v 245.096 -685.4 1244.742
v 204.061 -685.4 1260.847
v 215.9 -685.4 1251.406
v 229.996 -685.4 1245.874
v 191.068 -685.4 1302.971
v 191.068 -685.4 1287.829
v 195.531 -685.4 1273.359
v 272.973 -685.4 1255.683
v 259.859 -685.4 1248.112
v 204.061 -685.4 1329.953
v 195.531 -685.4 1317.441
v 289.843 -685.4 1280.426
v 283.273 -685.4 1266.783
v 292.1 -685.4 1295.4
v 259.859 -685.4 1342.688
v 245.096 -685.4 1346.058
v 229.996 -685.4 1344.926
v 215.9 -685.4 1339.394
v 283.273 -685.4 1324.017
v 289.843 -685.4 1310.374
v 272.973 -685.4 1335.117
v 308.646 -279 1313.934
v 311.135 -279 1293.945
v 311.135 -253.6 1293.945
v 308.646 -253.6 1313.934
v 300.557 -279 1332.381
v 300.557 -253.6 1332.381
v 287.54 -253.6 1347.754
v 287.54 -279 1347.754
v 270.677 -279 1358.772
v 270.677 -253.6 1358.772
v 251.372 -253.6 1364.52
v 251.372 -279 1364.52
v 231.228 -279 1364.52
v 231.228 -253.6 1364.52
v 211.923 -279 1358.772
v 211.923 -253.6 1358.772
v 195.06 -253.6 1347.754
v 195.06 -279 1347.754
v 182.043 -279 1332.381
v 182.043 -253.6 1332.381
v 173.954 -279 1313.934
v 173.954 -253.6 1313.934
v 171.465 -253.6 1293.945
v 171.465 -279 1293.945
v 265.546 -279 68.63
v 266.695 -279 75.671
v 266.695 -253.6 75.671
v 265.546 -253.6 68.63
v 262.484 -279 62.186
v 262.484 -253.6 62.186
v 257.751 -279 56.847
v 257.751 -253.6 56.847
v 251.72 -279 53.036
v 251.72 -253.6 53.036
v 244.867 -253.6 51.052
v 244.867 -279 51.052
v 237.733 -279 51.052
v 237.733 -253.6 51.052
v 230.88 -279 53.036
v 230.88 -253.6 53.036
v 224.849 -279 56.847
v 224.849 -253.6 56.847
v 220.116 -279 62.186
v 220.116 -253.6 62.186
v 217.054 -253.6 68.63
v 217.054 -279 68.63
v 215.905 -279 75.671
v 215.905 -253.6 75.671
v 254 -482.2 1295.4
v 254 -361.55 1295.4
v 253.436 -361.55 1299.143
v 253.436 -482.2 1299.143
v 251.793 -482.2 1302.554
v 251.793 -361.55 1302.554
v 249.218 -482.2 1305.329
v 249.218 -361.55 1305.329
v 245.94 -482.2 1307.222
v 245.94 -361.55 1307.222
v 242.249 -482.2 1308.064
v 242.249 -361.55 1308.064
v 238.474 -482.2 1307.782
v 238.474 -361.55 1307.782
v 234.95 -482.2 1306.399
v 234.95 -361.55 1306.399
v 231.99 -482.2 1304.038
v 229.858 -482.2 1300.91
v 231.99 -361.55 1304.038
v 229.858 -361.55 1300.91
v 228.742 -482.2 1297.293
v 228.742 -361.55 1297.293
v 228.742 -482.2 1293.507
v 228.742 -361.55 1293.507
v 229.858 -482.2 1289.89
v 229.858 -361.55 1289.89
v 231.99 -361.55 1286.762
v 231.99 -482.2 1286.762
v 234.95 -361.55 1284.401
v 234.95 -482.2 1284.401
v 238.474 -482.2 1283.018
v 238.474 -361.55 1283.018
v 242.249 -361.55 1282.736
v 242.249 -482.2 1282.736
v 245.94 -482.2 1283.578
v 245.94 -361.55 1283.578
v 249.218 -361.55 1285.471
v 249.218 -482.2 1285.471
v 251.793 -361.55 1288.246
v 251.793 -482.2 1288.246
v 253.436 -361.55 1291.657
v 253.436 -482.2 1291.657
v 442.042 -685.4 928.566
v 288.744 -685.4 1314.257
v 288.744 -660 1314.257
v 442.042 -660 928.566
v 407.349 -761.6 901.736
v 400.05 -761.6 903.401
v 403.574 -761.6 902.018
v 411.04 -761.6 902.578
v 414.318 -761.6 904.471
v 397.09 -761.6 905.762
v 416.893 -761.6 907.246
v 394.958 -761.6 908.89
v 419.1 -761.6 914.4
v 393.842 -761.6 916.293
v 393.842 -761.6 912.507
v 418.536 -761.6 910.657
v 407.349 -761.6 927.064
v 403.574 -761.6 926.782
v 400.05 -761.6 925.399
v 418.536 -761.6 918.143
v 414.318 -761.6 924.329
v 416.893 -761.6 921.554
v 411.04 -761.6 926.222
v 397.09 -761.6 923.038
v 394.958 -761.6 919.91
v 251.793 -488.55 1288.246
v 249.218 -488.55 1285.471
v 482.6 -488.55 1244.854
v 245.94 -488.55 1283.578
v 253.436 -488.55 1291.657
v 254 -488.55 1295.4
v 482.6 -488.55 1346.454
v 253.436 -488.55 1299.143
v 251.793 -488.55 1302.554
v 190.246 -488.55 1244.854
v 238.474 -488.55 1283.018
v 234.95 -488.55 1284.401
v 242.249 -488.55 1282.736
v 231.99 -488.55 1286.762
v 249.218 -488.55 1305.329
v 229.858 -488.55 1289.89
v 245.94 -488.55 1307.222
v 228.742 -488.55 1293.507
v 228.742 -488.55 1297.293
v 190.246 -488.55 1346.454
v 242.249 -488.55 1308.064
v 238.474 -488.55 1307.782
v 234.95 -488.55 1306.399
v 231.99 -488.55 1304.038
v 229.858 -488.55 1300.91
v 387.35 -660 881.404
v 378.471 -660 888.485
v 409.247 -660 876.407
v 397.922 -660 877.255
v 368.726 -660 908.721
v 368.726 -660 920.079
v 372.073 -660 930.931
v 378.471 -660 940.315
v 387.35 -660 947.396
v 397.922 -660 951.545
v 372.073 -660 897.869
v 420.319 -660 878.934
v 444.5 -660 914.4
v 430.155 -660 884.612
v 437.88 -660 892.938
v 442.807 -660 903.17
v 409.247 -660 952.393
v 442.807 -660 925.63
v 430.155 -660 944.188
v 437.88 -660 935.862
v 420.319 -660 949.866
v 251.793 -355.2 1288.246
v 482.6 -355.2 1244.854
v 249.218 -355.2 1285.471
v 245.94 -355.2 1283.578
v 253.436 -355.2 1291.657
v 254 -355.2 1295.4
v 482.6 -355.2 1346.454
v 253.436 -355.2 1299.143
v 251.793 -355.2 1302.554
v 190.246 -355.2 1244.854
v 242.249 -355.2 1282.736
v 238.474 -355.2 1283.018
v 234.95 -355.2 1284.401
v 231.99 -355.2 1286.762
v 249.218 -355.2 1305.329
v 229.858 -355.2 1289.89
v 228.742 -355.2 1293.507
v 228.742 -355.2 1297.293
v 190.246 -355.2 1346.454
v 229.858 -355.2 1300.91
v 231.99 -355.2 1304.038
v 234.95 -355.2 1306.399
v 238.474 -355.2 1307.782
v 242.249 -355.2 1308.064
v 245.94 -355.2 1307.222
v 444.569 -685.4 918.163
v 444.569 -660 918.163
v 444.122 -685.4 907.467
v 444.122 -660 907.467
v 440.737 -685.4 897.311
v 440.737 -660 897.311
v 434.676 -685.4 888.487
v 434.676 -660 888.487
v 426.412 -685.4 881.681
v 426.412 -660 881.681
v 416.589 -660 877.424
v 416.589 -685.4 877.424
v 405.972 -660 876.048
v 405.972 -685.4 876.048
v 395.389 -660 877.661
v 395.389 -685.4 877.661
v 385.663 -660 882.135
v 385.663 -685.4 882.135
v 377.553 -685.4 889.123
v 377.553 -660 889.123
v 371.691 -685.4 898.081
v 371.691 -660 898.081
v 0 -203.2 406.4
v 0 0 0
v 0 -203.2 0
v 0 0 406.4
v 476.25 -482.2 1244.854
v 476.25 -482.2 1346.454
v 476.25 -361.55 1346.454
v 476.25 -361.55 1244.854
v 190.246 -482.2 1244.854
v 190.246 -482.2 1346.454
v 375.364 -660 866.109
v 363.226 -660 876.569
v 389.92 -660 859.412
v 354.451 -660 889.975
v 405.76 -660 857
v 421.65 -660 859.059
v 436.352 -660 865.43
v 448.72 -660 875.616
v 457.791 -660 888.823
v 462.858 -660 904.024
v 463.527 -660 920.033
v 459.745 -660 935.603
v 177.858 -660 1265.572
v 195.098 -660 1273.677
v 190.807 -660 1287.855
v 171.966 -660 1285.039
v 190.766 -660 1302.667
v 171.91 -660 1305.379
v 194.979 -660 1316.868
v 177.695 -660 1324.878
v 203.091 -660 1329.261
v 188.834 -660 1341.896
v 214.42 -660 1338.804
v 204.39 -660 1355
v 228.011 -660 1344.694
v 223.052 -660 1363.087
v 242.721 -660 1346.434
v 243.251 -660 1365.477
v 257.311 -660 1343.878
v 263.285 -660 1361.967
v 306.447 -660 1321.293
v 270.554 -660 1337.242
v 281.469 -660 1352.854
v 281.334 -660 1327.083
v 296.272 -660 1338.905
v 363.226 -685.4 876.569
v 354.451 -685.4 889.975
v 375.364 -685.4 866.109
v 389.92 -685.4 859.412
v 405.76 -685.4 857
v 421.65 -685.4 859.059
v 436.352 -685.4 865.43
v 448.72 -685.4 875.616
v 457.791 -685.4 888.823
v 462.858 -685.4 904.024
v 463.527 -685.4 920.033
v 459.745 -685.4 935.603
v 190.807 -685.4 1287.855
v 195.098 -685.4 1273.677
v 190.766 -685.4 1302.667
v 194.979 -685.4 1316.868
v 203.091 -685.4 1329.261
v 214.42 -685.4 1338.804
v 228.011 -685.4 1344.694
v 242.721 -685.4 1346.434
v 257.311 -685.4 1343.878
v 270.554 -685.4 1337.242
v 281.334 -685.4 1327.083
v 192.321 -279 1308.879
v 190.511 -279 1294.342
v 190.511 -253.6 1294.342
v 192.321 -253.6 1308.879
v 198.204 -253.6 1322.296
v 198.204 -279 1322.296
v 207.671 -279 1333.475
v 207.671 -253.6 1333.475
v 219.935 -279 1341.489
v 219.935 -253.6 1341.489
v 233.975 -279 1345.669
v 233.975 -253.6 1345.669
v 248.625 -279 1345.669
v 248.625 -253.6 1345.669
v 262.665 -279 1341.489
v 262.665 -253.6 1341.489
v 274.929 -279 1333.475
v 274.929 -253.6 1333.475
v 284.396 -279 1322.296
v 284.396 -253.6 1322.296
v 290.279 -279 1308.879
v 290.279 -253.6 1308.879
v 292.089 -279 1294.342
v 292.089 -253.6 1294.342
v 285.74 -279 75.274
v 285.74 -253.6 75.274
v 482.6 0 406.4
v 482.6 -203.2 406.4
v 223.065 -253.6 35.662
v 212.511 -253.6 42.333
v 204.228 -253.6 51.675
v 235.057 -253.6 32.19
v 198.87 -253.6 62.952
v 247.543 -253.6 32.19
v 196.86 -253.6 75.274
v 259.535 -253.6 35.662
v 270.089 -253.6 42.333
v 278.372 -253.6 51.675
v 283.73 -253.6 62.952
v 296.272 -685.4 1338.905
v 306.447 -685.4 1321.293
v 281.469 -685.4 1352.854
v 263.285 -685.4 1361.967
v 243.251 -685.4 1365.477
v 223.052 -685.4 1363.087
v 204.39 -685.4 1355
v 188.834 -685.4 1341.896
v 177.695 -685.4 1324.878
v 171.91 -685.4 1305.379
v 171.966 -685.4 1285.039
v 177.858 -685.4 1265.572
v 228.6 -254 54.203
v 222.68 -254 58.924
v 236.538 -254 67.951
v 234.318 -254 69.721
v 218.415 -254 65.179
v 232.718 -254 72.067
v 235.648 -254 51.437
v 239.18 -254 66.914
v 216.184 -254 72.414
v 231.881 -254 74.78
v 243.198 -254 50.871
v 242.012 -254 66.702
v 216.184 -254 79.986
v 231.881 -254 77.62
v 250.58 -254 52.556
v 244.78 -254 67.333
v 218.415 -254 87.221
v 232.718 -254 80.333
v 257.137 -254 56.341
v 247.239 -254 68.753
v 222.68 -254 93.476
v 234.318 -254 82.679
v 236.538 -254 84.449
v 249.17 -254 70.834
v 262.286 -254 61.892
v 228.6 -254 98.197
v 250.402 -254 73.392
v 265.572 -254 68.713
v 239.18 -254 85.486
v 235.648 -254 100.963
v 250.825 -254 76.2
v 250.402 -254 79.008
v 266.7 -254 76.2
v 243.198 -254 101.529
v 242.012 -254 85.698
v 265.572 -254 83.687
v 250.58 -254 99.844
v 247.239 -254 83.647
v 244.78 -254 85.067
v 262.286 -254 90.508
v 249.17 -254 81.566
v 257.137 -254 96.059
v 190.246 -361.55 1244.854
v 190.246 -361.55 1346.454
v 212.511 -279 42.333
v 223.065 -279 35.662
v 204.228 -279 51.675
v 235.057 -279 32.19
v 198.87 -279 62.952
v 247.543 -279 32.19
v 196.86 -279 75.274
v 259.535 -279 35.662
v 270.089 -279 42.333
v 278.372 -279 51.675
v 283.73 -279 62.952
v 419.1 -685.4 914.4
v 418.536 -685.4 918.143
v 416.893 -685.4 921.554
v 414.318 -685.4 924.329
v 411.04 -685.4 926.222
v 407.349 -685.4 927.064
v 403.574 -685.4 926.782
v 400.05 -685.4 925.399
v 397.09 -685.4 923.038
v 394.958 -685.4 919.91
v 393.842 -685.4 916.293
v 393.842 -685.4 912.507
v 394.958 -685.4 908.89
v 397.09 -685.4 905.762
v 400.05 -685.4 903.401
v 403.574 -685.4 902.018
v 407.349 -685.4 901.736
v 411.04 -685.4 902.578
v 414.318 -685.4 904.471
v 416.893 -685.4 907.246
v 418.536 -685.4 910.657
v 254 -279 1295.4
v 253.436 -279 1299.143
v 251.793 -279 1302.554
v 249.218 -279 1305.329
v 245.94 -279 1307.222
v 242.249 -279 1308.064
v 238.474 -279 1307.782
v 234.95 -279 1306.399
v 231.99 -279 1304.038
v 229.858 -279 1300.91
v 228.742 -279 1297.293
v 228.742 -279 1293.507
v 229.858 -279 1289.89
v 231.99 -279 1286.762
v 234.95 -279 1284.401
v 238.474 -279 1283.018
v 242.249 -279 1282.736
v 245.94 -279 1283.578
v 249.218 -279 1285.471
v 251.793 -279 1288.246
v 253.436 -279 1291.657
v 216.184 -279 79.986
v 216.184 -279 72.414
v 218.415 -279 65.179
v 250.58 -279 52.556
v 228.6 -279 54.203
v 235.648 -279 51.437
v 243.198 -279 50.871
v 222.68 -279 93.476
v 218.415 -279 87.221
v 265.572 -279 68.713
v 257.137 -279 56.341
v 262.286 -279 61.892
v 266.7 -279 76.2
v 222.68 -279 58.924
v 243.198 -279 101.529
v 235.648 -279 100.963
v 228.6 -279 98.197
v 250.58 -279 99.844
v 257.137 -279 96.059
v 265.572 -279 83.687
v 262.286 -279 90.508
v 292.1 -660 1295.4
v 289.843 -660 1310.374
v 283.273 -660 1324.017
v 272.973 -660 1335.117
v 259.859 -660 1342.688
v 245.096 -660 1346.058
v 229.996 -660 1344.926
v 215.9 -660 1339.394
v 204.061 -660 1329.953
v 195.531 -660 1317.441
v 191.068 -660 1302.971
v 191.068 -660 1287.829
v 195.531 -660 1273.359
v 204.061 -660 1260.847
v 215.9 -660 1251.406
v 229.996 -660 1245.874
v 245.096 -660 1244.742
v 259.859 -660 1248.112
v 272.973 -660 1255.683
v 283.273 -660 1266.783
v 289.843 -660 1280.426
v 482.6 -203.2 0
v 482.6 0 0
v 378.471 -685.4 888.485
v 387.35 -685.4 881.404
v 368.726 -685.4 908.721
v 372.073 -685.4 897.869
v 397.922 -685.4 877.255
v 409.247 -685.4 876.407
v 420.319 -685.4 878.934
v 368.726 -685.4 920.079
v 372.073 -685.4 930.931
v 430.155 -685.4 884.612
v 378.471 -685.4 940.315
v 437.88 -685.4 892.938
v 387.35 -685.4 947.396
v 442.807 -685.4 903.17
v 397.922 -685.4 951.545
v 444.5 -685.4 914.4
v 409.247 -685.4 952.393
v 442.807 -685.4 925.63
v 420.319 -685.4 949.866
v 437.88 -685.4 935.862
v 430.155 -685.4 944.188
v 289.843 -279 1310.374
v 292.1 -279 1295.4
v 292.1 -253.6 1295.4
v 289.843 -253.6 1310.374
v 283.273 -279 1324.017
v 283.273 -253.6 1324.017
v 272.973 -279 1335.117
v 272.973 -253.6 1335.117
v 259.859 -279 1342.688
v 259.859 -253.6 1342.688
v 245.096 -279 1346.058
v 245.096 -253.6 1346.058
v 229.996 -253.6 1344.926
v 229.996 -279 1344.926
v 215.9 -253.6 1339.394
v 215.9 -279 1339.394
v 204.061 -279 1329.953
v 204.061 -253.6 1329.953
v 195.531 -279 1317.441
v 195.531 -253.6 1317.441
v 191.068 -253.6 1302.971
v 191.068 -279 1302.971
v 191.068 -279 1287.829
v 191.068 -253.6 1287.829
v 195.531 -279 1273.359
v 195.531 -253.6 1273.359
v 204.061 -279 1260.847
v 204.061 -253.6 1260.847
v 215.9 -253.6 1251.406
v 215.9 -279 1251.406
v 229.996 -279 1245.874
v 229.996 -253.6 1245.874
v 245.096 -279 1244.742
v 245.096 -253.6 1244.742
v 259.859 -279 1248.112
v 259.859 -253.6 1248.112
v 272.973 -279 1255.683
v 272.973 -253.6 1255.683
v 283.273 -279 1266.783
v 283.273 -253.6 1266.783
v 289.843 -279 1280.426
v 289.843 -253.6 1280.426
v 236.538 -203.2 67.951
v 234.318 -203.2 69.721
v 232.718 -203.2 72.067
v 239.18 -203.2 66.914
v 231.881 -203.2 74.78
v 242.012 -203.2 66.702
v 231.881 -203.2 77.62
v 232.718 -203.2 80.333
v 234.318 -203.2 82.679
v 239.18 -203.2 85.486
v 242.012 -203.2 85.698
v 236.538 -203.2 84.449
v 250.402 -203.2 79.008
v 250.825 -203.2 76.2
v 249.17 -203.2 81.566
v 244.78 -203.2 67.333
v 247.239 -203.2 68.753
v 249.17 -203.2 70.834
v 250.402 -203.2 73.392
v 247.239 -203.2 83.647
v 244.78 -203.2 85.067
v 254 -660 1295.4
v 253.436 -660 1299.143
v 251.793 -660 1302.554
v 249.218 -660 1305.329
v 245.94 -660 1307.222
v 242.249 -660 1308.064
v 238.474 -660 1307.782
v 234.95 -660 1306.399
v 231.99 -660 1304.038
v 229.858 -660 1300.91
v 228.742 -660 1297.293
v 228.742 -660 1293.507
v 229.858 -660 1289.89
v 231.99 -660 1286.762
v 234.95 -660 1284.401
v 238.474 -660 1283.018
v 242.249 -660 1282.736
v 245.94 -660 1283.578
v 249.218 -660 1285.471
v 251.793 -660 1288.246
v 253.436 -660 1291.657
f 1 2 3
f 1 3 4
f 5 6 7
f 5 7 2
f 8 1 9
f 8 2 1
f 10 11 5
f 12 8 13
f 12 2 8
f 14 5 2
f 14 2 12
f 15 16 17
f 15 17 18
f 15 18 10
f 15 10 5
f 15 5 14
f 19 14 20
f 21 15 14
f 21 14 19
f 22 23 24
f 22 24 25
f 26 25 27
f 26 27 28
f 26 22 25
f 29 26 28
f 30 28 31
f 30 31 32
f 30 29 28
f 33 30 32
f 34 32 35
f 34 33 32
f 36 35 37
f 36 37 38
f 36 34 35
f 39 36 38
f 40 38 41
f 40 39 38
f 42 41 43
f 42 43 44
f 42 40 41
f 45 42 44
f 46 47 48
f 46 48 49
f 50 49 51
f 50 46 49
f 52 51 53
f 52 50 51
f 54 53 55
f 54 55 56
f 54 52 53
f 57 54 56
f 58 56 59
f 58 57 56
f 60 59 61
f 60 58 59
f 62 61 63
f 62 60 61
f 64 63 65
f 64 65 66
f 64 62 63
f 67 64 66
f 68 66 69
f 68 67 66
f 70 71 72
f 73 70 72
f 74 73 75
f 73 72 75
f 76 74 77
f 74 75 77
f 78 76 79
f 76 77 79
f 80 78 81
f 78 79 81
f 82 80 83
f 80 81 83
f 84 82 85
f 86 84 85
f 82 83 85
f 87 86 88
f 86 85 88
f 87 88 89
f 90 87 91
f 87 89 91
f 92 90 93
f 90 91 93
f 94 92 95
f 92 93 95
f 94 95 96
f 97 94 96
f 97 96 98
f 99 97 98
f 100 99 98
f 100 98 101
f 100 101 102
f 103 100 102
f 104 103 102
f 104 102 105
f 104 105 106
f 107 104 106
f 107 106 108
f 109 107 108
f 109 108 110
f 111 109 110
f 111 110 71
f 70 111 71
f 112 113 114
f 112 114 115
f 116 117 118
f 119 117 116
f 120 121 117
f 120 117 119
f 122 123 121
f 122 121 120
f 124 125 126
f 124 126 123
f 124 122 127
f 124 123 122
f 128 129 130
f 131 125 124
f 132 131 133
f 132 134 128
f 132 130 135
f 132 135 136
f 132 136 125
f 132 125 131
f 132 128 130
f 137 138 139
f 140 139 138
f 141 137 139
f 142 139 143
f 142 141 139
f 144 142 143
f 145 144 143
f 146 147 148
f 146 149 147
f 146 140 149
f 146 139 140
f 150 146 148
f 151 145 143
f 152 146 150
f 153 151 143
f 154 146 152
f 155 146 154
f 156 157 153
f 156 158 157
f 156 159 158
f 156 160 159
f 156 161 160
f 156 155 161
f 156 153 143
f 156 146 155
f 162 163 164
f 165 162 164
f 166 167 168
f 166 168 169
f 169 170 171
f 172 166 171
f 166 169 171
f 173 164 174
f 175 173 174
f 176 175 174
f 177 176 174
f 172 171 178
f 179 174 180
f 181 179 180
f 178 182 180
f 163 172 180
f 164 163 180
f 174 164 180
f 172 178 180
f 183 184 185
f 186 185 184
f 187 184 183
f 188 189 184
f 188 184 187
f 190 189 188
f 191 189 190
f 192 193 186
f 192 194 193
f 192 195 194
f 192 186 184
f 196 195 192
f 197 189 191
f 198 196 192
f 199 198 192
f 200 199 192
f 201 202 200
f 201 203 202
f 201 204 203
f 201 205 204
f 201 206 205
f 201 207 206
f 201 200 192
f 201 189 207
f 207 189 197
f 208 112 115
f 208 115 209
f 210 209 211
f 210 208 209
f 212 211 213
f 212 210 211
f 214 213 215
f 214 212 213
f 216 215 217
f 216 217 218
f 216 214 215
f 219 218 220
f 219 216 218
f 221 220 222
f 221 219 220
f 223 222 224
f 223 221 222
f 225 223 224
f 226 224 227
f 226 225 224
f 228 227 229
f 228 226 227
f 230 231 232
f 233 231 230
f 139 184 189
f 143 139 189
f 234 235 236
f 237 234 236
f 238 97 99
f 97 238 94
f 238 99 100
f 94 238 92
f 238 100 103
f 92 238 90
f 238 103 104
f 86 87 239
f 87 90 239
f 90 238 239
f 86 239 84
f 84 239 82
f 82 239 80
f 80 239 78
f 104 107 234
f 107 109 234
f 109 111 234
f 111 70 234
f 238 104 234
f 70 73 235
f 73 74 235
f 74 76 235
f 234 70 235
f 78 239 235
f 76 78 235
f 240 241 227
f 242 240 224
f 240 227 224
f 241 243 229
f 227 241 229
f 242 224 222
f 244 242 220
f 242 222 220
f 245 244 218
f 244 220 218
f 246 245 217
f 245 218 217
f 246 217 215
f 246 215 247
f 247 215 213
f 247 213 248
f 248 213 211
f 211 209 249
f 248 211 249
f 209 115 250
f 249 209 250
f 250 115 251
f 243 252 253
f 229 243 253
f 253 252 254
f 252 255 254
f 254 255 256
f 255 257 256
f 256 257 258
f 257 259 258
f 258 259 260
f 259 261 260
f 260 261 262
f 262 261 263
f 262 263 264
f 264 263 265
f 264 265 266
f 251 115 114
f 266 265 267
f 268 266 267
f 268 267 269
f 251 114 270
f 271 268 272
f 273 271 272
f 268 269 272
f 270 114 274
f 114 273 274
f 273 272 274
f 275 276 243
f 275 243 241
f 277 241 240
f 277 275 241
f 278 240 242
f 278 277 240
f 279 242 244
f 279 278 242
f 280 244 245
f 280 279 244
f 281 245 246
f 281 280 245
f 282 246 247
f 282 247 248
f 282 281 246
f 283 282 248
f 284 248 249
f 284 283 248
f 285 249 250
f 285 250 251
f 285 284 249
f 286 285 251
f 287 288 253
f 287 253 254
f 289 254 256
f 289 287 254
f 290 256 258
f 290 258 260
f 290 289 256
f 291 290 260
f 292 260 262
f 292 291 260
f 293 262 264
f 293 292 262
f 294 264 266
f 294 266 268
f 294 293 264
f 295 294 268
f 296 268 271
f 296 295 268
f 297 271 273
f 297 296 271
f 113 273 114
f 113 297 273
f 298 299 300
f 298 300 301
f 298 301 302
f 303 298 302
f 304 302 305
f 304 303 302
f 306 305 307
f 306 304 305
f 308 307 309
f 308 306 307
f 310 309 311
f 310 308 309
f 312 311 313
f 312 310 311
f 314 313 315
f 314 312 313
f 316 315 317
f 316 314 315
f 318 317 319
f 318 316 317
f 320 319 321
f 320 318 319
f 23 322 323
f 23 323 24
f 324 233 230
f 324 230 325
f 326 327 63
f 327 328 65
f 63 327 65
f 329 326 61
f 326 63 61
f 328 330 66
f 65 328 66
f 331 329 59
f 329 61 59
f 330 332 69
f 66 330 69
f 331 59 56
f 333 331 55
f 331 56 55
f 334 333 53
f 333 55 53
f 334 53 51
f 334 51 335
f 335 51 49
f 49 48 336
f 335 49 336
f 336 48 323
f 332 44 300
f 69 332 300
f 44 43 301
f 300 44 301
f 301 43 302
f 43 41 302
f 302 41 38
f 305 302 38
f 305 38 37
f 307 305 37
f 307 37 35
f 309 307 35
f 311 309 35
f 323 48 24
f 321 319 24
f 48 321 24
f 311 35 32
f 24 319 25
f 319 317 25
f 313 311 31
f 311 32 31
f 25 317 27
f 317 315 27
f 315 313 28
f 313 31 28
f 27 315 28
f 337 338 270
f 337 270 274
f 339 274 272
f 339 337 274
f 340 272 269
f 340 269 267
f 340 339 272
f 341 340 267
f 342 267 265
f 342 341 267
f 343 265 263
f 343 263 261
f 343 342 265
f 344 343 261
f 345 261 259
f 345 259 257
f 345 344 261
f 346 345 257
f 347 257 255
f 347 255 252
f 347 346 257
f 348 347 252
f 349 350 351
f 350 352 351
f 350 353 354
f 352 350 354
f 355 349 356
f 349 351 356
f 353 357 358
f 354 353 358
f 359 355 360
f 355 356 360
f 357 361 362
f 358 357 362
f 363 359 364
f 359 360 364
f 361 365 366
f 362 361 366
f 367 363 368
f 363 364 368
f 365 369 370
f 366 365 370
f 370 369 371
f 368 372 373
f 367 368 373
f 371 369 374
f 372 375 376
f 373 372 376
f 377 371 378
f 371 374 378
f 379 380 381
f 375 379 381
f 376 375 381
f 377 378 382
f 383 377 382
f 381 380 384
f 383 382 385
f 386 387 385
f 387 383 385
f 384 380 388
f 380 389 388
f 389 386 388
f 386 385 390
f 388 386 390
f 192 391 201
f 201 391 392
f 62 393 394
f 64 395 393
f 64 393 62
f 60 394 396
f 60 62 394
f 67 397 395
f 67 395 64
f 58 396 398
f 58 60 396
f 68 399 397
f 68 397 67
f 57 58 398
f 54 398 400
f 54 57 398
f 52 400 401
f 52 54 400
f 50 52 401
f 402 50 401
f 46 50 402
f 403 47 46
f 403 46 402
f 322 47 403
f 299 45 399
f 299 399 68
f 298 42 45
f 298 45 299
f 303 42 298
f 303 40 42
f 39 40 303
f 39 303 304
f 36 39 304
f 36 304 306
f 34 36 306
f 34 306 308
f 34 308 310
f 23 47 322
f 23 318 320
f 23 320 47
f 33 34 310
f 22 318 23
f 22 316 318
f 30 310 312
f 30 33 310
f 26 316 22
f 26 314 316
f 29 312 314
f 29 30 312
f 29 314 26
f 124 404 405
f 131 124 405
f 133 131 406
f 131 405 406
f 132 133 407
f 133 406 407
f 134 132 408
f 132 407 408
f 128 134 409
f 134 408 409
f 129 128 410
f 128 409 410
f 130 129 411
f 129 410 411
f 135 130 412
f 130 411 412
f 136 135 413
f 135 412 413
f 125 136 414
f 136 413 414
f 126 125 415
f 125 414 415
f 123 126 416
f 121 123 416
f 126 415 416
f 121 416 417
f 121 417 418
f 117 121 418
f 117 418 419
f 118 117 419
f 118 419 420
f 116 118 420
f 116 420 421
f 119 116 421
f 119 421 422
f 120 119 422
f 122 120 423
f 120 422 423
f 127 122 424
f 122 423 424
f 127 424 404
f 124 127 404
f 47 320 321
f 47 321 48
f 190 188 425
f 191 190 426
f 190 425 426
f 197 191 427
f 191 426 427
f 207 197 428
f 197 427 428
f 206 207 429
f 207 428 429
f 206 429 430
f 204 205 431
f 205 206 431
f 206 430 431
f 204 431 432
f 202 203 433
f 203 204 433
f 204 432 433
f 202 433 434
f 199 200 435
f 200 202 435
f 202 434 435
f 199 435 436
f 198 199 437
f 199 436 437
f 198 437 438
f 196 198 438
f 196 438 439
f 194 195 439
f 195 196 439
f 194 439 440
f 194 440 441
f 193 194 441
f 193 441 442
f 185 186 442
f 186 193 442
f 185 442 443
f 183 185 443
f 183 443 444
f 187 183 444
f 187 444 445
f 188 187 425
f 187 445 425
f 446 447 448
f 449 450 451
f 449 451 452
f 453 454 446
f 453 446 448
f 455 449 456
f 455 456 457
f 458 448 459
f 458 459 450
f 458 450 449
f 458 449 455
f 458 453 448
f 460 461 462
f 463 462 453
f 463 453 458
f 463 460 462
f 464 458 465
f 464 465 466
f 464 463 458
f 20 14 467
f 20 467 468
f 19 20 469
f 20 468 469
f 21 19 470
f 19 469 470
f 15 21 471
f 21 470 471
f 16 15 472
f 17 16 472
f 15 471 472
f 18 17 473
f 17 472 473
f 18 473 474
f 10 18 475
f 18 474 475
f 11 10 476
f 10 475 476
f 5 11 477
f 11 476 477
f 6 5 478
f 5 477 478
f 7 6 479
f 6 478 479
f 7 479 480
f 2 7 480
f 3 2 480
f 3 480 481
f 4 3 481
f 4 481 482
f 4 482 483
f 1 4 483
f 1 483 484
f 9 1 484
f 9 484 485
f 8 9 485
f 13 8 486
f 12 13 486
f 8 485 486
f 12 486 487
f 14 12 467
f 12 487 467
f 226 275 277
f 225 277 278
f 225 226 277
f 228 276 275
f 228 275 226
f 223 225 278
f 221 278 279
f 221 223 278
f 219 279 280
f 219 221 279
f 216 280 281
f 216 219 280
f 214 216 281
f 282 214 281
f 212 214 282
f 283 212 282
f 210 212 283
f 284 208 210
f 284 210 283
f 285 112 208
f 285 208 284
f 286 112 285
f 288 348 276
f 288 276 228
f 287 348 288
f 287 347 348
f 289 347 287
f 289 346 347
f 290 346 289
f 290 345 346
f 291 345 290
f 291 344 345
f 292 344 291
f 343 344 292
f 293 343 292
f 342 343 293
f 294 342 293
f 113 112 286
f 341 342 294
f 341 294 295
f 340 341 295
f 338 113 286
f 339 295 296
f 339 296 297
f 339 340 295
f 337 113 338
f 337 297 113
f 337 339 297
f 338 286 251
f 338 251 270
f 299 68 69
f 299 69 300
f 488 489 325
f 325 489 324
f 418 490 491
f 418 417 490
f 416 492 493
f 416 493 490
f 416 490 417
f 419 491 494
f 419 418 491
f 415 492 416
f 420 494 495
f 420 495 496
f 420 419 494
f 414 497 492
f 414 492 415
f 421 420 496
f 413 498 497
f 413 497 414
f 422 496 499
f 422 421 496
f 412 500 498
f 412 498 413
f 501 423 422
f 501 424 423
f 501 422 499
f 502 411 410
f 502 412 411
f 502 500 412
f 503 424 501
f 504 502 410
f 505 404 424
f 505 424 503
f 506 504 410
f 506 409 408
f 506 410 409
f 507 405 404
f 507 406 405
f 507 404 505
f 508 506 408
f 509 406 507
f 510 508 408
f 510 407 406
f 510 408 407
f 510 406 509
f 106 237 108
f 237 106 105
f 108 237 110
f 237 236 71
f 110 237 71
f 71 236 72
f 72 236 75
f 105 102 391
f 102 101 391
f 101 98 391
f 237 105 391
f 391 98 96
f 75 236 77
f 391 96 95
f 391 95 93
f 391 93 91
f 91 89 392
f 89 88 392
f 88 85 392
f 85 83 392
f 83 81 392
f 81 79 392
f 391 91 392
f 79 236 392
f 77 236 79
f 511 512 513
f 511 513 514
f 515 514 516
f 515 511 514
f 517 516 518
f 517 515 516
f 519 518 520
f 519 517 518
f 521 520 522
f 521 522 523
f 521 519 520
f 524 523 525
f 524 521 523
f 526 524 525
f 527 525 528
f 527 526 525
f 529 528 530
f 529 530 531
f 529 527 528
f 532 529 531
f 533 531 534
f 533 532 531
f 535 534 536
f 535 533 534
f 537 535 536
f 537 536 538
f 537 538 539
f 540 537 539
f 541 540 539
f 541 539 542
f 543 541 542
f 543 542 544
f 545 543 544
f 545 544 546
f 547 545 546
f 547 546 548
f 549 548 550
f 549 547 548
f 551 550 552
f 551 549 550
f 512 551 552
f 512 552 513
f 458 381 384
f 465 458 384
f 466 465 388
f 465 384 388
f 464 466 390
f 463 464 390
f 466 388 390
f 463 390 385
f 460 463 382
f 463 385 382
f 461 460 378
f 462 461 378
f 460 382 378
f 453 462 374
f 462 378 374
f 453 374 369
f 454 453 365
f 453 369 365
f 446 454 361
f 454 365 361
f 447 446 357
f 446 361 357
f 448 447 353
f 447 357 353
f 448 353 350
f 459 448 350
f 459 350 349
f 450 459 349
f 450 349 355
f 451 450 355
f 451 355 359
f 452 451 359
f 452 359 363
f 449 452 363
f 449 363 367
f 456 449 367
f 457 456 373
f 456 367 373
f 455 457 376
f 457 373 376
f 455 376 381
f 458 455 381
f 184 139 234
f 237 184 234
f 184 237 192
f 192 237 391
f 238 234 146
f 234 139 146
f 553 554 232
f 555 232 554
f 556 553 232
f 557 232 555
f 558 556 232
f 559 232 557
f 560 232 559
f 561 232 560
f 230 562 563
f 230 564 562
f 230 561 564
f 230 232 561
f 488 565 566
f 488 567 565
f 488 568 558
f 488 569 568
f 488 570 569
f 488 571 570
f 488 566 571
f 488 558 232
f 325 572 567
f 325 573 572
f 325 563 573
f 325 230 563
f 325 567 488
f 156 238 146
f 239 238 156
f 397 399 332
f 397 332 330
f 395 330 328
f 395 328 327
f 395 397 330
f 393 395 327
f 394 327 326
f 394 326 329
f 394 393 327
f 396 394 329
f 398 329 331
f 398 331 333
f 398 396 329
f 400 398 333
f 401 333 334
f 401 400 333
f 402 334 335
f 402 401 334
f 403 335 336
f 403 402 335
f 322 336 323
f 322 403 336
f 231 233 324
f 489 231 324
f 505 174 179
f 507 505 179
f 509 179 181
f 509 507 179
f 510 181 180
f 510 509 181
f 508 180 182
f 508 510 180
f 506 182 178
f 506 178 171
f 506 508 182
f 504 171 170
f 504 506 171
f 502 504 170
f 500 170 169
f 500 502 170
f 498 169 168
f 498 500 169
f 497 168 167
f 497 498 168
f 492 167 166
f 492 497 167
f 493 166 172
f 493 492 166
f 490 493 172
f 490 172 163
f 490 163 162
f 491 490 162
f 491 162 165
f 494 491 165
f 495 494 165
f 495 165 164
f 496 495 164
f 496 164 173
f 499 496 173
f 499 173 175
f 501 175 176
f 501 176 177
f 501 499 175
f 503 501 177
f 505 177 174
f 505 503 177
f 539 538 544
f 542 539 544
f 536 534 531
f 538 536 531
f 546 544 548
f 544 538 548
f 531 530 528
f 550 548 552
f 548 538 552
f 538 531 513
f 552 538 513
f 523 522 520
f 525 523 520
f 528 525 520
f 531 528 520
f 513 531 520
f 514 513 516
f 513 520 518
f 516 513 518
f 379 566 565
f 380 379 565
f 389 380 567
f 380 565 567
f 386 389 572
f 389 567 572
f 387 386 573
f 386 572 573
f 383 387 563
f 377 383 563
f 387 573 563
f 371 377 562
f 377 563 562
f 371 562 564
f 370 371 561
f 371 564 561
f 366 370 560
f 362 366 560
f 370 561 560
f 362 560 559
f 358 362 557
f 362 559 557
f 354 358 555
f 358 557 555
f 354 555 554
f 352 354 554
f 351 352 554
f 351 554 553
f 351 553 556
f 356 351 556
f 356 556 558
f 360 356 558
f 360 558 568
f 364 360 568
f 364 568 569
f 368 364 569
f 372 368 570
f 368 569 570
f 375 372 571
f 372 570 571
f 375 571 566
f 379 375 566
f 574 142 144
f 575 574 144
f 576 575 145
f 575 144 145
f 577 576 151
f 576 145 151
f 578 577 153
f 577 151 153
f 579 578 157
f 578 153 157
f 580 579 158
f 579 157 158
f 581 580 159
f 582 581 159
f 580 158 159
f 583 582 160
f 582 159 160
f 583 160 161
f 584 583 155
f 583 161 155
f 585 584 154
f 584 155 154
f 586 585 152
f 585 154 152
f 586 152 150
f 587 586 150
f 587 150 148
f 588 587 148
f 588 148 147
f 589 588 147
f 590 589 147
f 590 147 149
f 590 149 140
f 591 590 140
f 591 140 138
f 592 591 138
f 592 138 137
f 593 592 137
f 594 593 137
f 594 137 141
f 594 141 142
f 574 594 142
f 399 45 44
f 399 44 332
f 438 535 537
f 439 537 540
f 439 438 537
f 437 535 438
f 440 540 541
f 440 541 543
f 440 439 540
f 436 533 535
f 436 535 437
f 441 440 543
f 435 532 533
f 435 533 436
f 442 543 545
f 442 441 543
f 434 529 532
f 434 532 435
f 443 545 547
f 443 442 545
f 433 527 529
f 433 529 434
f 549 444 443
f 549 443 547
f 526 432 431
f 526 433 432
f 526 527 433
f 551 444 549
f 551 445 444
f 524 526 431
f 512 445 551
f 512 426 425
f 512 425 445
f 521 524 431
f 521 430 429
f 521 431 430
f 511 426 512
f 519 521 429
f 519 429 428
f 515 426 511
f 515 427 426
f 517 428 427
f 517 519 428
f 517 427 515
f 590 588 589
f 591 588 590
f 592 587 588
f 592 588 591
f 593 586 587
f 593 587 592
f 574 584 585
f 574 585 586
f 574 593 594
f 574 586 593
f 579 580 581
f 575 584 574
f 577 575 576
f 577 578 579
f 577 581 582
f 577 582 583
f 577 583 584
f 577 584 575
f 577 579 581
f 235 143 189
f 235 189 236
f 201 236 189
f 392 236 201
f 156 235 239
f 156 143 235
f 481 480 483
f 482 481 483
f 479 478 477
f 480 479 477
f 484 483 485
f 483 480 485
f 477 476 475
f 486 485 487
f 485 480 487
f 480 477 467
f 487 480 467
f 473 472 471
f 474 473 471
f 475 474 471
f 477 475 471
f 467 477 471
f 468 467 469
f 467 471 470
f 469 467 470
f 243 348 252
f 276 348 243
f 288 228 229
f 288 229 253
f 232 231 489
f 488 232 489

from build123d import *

# Parameters (mm, degrees)
F0_W      = 482.6
F0_H      = 406.4
F1_DEPTH  = 203.2
F2_R      = 9.525
F3_DEPTH  = 50.8
F4_R      = 25.4
F5_DEPTH  = 25
F7_DEPTH  = 25.4
F8_R      = 50.799873
F9_DEPTH  = 25.4
F11_R     = 12.7
F12_DEPTH = 381
F13_R     = 50.799873
F14_DEPTH = 25.4
F15_R     = 38.1
F16_DEPTH = 25.4
F18_DEPTH = 25.4
F19_R     = 12.7
F20_DEPTH = 76.2
F22_W     = 286.003873
F22_H     = 101.6
F22_R     = 12.7
F23_DEPTH = 6.35
F24_W     = 127
F24_H     = 101.6
F25_DEPTH = 6.35
F26_W     = 292.353873
F26_H     = 101.6
F27_DEPTH = 6.35


with BuildPart() as f1:
    # F0 (on Front) → F1 (new body)
    with BuildSketch(Plane.XZ):
        with Locations((241.3, 203.2)):
            Rectangle(F0_W, F0_H)
    extrude(amount=F1_DEPTH)

    # F2 (on face) → F3 (join)
    with BuildSketch(Plane.XZ.offset(203.2)):
        with Locations((241.3, 76.2)):
            Circle(F2_R)
    extrude(amount=F3_DEPTH)

    # F4 (on face) → F5 (join)
    with BuildSketch(Plane.XZ.offset(254)):
        with Locations((241.3, 76.2)):
            Circle(F4_R)
    extrude(amount=F5_DEPTH)


with BuildPart() as f7:
    # F6 (on face) → F7 (new body)
    with BuildSketch(Plane.XZ.offset(279)):
        with BuildLine():
            ThreePointArc((311.1348400541, 1293.9447973958), (241.3, 1365.25), (171.4651599459, 1293.9447973958))
            Line((171.4651599459, 1293.9447973958), (196.85954726, 75.2739598958))
            ThreePointArc((196.85954726, 75.2739598958), (241.3, 31.7499), (285.74045274, 75.2739598958))
            Line((285.74045274, 75.2739598958), (311.1348400541, 1293.9447973958))
        make_face()
        with BuildLine():
            Line((292.0889745848, 1294.3416708333), (266.6945872707, 75.6708333333))
            ThreePointArc((266.6945872707, 75.6708333333), (241.3, 50.7999), (215.9054127293, 75.6708333333))
            Line((215.9054127293, 75.6708333333), (190.5110254152, 1294.3416708333))
            ThreePointArc((190.5110254152, 1294.3416708333), (241.3, 1346.2), (292.0889745848, 1294.3416708333))
        make_face(mode=Mode.SUBTRACT)
    extrude(amount=-F7_DEPTH)


with BuildPart() as f9:
    # F8 (on face) → F9 (new body)
    with BuildSketch(Plane.XZ.offset(279)):
        with Locations((241.3, 1295.4)):
            Circle(F8_R)
    extrude(amount=-F9_DEPTH)

    # F11 (on face) → F12 (join)
    with BuildSketch(Plane.XZ.offset(279)):
        with Locations((241.3, 1295.4)):
            Circle(F11_R)
    extrude(amount=F12_DEPTH)

    # F22 (on offset) → F23 (join)
    with BuildSketch(Plane.XZ.offset(482.2)):
        with Locations((333.2480635, 1295.653873)):
            Rectangle(F22_W, F22_H)
        with Locations((241.3, 1295.4)):
            Circle(F22_R, mode=Mode.SUBTRACT)
    extrude(amount=F23_DEPTH)

    # F24 (on face) → F25 (join)
    with BuildSketch(Plane.YZ.offset(476.25)):
        with Locations((-425.05, 1295.653873)):
            Rectangle(F24_W, F24_H)
    extrude(amount=F25_DEPTH)

    # F26 (on face) → F27 (join)
    with BuildSketch(Plane(origin=(0, -361.55, 0), x_dir=(-1, 0, 0), z_dir=(0, 1, 0))):
        with Locations((-336.4230635, 1295.653873)):
            Rectangle(F26_W, F26_H)
    extrude(amount=F27_DEPTH)


with BuildPart() as f14:
    # F13 (on face) → F14 (new body)
    with BuildSketch(Plane.XZ.offset(660)):
        with Locations((241.3, 1295.4)):
            Circle(F13_R)
    extrude(amount=F14_DEPTH)


with BuildPart() as f16:
    # F15 (on face) → F16 (new body)
    with BuildSketch(Plane.XZ.offset(685.4)):
        with Locations((406.4, 914.4)):
            Circle(F15_R)
    extrude(amount=-F16_DEPTH)

    # F19 (on face) → F20 (join)
    with BuildSketch(Plane.XZ.offset(685.4)):
        with Locations((406.4, 914.4)):
            Circle(F19_R)
    extrude(amount=F20_DEPTH)


with BuildPart() as f18:
    # F17 (on face) → F18 (new body)
    with BuildSketch(Plane.XZ.offset(685.4)):
        with BuildLine():
            ThreePointArc((354.4513551765, 889.9754730445), (429.22425735, 861.7286368847), (459.7447992435, 935.6026321402))
            Line((459.7447992435, 935.6026321402), (306.4466279593, 1321.2934330503))
            ThreePointArc((306.4466279593, 1321.2934330503), (213.4261786882, 1359.7242030272), (177.8584070931, 1265.571870675))
            Line((177.8584070931, 1265.571870675), (354.4513551765, 889.9754730445))
        make_face()
        with BuildLine():
            ThreePointArc((195.0980016141, 1273.6773552841), (221.0006003752, 1342.244768365), (288.7437078564, 1314.2571613224))
            Line((288.7437078564, 1314.2571613224), (442.0418791406, 928.5663604122))
            ThreePointArc((442.0418791406, 928.5663604122), (421.649835663, 879.2080715469), (371.6909496976, 898.0809576536))
            Line((371.6909496976, 898.0809576536), (195.0980016141, 1273.6773552841))
        make_face(mode=Mode.SUBTRACT)
    extrude(amount=-F18_DEPTH)


solid = Compound([f1.part, f7.part, f9.part, f14.part, f16.part, f18.part])
